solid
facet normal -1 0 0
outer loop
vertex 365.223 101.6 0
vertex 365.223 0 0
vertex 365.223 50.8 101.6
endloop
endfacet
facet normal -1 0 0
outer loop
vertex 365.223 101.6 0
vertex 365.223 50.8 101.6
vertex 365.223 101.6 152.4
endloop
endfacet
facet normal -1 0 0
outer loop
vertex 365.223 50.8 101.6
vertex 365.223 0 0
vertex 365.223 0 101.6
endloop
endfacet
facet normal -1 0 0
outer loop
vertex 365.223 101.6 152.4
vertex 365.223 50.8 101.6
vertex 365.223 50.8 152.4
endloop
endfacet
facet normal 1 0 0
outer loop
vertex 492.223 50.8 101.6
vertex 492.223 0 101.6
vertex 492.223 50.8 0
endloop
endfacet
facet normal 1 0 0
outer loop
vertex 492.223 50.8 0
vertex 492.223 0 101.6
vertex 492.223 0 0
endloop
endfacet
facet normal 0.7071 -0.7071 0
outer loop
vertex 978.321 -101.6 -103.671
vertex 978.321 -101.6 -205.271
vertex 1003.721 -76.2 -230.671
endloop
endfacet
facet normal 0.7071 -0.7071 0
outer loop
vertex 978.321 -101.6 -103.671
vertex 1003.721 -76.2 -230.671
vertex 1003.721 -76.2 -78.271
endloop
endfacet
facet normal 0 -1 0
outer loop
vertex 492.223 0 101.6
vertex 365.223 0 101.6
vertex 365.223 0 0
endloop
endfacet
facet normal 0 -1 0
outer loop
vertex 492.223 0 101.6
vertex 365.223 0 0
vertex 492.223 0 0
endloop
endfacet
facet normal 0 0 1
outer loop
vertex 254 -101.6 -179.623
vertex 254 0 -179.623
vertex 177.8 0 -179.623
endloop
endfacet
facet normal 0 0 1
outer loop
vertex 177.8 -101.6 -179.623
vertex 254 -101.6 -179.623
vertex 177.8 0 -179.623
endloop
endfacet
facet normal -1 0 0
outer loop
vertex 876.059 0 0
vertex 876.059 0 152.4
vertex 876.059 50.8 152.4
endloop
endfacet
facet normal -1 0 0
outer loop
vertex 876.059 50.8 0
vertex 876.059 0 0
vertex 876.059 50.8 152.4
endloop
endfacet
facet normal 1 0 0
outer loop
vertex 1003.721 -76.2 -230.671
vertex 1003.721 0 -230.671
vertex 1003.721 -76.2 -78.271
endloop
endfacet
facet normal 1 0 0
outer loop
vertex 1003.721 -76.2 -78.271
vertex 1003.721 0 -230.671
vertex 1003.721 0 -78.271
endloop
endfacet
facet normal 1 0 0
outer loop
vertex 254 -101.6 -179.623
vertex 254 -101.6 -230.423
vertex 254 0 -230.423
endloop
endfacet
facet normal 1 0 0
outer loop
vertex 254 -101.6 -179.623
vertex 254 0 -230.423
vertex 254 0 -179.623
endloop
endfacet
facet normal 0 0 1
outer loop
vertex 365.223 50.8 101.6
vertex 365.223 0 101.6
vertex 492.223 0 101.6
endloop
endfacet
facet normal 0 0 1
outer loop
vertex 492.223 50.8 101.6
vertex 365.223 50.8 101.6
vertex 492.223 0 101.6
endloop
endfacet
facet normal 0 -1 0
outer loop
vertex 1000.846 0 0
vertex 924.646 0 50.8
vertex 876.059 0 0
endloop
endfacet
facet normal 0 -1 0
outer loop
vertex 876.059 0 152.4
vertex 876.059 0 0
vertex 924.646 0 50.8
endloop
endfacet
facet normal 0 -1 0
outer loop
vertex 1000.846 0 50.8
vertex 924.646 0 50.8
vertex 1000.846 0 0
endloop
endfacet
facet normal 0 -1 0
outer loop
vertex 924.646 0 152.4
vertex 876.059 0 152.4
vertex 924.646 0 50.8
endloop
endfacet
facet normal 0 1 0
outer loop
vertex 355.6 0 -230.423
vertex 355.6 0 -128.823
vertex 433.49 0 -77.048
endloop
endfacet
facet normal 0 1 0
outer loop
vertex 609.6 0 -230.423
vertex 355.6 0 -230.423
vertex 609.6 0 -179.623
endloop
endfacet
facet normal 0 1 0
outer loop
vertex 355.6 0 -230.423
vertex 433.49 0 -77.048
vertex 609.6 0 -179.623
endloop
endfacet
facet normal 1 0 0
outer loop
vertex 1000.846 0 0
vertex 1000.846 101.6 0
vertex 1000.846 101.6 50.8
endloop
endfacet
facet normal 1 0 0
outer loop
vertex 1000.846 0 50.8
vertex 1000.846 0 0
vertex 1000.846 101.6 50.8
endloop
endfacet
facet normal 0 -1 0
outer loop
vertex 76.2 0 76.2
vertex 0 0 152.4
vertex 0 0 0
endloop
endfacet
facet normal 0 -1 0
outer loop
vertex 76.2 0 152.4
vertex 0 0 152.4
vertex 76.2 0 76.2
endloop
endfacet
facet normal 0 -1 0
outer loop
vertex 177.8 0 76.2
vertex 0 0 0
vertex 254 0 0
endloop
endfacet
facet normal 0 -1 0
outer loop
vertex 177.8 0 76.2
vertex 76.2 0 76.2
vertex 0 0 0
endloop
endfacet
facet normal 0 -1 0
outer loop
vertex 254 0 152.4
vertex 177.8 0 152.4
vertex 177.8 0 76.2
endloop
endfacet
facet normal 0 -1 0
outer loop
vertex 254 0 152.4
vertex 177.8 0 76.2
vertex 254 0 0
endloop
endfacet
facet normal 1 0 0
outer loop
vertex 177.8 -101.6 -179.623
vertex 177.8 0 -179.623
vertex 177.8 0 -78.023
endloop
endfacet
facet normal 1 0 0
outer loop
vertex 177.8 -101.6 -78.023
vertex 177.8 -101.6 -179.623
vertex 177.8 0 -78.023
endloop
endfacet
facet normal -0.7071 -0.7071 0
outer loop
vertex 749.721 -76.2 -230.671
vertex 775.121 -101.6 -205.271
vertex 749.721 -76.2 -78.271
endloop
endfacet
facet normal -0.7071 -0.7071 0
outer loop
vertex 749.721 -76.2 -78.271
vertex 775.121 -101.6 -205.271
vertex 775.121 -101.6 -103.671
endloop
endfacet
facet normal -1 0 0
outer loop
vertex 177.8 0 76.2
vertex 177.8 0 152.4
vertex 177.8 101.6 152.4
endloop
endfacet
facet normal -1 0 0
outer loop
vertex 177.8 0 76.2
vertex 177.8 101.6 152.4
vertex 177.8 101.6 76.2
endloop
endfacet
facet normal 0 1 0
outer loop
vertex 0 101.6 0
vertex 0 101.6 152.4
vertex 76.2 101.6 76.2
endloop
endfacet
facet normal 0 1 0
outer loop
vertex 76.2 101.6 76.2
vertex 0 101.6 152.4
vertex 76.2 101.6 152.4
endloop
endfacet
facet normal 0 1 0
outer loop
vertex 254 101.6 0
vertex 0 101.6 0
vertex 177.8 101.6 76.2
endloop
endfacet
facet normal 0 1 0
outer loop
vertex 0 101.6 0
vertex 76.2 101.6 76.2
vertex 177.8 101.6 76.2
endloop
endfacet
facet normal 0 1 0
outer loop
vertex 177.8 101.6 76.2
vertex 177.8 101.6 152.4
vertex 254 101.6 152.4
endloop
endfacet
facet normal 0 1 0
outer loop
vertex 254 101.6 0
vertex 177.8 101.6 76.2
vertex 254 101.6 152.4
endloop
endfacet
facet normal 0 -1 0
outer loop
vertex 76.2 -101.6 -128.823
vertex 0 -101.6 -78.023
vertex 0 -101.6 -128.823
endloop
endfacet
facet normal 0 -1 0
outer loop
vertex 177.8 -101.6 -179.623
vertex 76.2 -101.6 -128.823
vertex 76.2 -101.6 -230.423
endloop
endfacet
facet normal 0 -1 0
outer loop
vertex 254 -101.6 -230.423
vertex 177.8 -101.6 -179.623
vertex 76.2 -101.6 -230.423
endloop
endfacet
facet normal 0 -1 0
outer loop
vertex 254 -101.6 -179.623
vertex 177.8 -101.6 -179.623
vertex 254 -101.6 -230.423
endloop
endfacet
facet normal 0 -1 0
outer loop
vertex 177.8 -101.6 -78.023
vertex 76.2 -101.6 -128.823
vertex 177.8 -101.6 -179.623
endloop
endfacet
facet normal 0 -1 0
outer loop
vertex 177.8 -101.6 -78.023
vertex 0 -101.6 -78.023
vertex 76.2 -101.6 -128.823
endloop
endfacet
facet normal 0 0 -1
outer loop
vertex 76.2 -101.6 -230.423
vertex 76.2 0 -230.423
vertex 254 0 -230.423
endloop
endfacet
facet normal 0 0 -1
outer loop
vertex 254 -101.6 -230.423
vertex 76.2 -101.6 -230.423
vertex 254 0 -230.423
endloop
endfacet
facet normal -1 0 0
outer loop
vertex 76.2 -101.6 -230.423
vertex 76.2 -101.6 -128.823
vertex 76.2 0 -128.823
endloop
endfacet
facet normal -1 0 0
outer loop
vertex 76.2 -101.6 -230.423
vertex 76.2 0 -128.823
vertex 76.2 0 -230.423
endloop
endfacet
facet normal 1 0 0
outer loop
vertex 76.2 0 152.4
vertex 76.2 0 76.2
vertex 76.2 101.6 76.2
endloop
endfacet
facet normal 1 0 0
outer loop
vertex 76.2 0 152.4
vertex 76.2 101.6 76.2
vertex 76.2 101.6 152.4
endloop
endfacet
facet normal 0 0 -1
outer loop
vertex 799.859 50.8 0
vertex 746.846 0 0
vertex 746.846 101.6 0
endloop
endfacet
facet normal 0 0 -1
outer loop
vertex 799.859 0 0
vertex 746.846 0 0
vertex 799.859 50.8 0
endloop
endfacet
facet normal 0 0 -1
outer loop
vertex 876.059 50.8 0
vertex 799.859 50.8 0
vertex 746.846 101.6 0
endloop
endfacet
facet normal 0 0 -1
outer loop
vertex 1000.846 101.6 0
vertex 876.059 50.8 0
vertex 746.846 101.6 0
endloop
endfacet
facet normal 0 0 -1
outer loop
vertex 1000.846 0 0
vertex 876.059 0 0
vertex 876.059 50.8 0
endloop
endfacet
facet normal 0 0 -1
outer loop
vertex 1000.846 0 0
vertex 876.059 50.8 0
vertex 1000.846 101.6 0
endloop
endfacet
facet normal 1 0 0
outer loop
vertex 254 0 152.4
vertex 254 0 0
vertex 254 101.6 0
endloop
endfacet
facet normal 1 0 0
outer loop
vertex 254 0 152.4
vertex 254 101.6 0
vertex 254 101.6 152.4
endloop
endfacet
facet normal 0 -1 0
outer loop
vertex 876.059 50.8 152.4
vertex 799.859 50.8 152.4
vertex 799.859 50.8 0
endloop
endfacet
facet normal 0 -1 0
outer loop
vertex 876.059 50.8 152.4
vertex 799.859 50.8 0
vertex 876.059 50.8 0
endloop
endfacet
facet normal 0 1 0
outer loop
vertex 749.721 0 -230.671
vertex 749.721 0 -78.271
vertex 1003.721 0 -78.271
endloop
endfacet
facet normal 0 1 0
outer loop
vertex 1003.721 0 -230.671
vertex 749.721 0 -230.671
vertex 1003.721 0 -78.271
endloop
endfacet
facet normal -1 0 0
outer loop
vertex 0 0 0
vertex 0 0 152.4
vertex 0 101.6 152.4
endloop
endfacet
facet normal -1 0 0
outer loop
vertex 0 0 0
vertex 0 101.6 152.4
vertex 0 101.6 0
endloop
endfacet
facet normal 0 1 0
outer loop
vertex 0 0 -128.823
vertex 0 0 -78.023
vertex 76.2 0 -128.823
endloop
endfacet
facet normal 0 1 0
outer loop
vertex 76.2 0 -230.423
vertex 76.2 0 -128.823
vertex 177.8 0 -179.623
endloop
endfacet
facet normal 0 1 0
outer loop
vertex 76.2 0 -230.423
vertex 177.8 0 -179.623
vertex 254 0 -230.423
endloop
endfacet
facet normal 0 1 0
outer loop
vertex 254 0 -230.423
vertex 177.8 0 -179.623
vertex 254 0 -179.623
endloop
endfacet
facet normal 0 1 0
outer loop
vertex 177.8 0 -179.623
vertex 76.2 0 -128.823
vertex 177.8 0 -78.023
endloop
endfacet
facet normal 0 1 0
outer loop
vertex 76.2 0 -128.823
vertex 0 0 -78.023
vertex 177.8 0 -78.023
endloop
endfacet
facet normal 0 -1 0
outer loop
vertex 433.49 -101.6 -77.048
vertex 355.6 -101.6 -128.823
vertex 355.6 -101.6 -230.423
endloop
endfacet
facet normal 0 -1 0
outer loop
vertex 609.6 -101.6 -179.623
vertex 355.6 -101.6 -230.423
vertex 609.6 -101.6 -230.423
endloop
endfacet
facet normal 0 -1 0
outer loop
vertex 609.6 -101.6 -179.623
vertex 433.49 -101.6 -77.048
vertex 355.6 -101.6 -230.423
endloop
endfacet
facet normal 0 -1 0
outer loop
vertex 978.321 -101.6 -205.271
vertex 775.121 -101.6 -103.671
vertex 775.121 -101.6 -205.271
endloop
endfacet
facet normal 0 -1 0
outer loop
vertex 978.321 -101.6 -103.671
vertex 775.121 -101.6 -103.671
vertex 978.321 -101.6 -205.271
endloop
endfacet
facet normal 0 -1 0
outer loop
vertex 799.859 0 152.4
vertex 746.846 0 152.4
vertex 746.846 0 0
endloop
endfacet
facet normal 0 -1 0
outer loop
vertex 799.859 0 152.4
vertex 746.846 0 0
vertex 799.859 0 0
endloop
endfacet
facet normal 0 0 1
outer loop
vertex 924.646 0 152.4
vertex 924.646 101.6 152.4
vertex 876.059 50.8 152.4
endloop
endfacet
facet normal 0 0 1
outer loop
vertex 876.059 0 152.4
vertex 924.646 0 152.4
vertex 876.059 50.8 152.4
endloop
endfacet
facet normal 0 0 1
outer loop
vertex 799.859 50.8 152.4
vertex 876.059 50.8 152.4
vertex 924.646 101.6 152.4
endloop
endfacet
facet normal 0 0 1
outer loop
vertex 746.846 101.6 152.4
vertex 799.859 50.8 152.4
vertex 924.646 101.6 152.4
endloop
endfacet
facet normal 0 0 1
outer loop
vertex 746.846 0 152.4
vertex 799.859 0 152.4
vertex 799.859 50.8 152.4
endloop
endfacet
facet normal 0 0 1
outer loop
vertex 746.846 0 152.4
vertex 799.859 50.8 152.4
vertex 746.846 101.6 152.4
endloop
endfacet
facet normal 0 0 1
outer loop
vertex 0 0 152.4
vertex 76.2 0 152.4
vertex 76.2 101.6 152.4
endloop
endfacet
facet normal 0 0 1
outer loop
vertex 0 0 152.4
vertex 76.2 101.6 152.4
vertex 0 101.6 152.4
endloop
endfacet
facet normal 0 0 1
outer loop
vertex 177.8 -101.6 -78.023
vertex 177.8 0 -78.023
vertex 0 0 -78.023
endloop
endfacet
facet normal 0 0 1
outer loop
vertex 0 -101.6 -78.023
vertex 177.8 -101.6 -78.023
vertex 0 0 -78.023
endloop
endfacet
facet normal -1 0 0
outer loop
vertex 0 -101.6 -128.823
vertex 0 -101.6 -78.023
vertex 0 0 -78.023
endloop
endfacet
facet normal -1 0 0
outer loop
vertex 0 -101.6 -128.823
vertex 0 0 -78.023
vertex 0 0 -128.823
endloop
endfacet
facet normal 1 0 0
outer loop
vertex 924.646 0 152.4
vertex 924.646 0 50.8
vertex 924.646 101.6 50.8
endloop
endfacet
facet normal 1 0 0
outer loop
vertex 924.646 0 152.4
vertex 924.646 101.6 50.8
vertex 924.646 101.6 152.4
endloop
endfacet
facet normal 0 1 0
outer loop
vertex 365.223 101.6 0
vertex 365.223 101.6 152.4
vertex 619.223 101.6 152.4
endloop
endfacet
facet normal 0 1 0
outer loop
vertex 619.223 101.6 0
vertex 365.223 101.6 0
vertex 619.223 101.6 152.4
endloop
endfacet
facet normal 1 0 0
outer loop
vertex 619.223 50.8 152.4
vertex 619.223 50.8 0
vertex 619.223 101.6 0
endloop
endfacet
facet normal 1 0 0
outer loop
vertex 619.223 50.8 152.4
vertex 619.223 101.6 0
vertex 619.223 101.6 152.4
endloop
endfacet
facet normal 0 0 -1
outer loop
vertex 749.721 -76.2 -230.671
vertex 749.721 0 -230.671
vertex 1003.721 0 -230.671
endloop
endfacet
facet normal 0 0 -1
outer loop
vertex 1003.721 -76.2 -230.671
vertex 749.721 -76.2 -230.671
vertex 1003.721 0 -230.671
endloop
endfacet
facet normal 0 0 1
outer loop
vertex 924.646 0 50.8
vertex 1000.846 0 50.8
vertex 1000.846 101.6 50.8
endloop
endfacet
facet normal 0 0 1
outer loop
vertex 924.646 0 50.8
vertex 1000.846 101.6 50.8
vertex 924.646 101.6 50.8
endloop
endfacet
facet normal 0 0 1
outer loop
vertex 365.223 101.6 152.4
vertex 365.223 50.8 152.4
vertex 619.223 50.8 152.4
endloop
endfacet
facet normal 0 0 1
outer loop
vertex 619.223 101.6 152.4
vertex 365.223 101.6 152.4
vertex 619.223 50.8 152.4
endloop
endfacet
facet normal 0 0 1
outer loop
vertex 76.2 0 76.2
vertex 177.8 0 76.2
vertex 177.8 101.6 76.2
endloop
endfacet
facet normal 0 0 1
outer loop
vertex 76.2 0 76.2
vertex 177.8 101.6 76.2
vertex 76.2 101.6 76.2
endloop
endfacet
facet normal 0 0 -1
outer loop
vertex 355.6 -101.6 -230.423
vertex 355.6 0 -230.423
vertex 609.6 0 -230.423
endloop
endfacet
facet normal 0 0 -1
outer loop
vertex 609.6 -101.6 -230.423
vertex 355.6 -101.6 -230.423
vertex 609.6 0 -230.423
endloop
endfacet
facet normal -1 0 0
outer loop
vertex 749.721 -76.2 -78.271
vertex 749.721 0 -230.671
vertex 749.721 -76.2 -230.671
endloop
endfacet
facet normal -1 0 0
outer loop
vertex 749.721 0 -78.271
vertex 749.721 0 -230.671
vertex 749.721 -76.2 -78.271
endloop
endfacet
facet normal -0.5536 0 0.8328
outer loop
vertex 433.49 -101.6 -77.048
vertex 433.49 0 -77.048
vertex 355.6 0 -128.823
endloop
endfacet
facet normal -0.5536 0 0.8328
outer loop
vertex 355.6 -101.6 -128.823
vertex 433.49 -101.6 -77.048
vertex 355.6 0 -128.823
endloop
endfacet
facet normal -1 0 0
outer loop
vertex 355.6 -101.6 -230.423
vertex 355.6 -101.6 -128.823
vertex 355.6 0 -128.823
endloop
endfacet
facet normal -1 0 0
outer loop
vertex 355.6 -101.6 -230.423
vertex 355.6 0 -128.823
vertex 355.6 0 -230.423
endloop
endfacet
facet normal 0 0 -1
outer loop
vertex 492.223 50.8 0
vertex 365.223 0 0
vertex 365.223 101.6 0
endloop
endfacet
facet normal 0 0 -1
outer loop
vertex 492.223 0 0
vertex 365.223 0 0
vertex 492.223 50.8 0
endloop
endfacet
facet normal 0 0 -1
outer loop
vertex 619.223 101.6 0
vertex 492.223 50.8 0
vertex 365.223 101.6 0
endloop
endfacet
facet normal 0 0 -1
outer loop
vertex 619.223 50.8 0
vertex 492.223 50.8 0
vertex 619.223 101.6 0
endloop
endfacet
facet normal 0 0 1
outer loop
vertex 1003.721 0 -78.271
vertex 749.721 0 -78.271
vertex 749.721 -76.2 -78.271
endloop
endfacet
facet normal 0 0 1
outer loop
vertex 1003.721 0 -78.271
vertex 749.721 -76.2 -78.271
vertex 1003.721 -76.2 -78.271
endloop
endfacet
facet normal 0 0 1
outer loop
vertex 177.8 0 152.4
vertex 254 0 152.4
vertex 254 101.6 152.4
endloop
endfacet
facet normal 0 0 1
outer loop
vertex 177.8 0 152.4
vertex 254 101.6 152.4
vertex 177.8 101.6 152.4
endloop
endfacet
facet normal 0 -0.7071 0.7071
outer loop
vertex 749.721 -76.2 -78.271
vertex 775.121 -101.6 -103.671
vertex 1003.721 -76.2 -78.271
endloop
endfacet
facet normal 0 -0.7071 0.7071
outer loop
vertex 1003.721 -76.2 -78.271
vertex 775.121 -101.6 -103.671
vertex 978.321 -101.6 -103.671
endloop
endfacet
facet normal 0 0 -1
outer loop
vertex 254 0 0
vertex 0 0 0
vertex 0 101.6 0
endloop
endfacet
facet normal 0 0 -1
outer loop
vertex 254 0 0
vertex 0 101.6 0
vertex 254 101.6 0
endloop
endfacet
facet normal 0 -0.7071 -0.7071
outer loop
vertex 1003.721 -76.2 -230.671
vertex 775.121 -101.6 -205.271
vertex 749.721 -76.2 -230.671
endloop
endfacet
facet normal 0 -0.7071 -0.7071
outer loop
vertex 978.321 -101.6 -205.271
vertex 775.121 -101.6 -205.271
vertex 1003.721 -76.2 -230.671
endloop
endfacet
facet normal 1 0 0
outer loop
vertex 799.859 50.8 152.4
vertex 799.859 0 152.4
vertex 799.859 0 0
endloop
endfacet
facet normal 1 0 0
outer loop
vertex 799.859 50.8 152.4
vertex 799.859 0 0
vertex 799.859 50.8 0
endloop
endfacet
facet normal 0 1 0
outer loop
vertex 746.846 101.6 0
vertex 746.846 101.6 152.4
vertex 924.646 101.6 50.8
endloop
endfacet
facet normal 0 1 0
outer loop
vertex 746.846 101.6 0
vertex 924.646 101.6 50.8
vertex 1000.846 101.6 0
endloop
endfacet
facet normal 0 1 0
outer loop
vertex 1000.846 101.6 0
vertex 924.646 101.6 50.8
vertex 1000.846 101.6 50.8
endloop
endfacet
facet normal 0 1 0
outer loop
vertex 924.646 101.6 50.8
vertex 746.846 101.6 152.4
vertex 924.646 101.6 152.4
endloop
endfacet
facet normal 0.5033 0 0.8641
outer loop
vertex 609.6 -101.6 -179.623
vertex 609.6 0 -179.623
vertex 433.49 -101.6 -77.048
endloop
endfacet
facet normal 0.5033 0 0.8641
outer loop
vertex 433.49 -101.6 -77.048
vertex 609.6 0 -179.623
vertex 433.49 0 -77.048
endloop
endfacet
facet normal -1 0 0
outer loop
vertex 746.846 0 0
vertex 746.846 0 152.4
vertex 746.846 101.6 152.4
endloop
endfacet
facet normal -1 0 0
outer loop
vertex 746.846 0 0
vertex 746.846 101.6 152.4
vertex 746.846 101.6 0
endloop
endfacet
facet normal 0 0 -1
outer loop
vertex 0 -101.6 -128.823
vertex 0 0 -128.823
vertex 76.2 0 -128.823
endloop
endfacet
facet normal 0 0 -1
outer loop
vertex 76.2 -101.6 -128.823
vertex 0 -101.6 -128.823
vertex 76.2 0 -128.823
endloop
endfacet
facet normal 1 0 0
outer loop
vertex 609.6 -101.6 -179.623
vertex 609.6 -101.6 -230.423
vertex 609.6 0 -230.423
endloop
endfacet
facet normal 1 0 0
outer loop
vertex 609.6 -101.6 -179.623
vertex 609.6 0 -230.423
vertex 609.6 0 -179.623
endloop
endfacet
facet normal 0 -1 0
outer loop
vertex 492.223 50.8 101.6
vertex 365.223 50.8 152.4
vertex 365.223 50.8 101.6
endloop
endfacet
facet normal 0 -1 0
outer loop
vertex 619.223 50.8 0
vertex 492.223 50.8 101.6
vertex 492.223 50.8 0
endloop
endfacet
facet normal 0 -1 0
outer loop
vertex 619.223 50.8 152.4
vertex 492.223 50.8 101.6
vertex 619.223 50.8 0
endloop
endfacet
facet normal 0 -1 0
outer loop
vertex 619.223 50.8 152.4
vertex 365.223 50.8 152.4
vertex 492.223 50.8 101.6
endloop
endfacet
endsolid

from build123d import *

# Parameters (mm, degrees)
F1_DEPTH  = 101.6
F2_W      = 254
F2_H      = 152.4
F3_DEPTH  = 101.6
F5_DEPTH  = 50.8
F7_DEPTH  = 101.6
F8_W      = 76.2
F8_H      = 50.8
F9_DEPTH  = 152.4
F11_DEPTH = 101.6
F13_DEPTH = 101.6
F14_W     = 254
F14_H     = 152.4
F15_DEPTH = 101.6
F16_SIZE  = 25.4


with BuildPart() as f1:
    # F0 (on Front) → F1 (new body)
    with BuildSketch(Plane.XZ):
        Polygon((0, 152.4), (0, 0), (254, 0), (254, 152.4), (177.8, 152.4), (177.8, 76.2), (76.2, 76.2), (76.2, 152.4), align=None)
    extrude(amount=-F1_DEPTH)


with BuildPart() as f3:
    # F2 (on Front) → F3 (new body)
    with BuildSketch(Plane.XZ):
        with Locations((492.222992, 76.2)):
            Rectangle(F2_W, F2_H)
    extrude(amount=-F3_DEPTH)

    # F4 (on face) → F5 (cut)
    with BuildSketch(Plane.XZ):
        Polygon((365.222992, 152.4), (365.222992, 101.6), (492.222992, 101.6), (492.222992, 0), (619.222992, 0), (619.222992, 152.4), align=None)
    extrude(amount=-F5_DEPTH, mode=Mode.SUBTRACT)


with BuildPart() as f7:
    # F6 (on Front) → F7 (new body)
    with BuildSketch(Plane.XZ):
        Polygon((746.84569, 152.4), (746.84569, 0), (1000.84569, 0), (1000.84569, 50.8), (924.64569, 50.8), (924.64569, 152.4), align=None)
    extrude(amount=-F7_DEPTH)

    # F8 (on face) → F9 (cut)
    with BuildSketch(Plane.XY.offset(152.4)):
        with Locations((837.959405, 25.4)):
            Rectangle(F8_W, F8_H)
    extrude(amount=-F9_DEPTH, mode=Mode.SUBTRACT)


with BuildPart() as f11:
    # F10 (on Front) → F11 (new body)
    with BuildSketch(Plane.XZ):
        Polygon((177.8, -78.023376), (0, -78.023376), (0, -128.823376), (76.2, -128.823376), (76.2, -230.423376), (254, -230.423376), (254, -179.623376), (177.8, -179.623376), align=None)
    extrude(amount=F11_DEPTH)


with BuildPart() as f13:
    # F12 (on Front) → F13 (new body)
    with BuildSketch(Plane.XZ):
        Polygon((355.6, -128.823376), (355.6, -230.423376), (609.6, -230.423376), (609.6, -179.623376), (433.490366, -77.047892), align=None)
    extrude(amount=F13_DEPTH)


with BuildPart() as f15:
    # F14 (on Front) → F15 (new body)
    with BuildSketch(Plane.XZ):
        with Locations((876.721174, -154.470949)):
            Rectangle(F14_W, F14_H)
    extrude(amount=F15_DEPTH)

    # F16
    f16_edges = [f15.edges().sort_by_distance(p)[0] for p in [
        (1003.721174, -101.6, -154.470949),
        (876.721174, -101.6, -78.270949),
        (749.721174, -101.6, -154.470949),
        (876.721174, -101.6, -230.670949),
    ]]
    chamfer(f16_edges, length=F16_SIZE)


solid = Compound([f1.part, f3.part, f7.part, f11.part, f13.part, f15.part])
